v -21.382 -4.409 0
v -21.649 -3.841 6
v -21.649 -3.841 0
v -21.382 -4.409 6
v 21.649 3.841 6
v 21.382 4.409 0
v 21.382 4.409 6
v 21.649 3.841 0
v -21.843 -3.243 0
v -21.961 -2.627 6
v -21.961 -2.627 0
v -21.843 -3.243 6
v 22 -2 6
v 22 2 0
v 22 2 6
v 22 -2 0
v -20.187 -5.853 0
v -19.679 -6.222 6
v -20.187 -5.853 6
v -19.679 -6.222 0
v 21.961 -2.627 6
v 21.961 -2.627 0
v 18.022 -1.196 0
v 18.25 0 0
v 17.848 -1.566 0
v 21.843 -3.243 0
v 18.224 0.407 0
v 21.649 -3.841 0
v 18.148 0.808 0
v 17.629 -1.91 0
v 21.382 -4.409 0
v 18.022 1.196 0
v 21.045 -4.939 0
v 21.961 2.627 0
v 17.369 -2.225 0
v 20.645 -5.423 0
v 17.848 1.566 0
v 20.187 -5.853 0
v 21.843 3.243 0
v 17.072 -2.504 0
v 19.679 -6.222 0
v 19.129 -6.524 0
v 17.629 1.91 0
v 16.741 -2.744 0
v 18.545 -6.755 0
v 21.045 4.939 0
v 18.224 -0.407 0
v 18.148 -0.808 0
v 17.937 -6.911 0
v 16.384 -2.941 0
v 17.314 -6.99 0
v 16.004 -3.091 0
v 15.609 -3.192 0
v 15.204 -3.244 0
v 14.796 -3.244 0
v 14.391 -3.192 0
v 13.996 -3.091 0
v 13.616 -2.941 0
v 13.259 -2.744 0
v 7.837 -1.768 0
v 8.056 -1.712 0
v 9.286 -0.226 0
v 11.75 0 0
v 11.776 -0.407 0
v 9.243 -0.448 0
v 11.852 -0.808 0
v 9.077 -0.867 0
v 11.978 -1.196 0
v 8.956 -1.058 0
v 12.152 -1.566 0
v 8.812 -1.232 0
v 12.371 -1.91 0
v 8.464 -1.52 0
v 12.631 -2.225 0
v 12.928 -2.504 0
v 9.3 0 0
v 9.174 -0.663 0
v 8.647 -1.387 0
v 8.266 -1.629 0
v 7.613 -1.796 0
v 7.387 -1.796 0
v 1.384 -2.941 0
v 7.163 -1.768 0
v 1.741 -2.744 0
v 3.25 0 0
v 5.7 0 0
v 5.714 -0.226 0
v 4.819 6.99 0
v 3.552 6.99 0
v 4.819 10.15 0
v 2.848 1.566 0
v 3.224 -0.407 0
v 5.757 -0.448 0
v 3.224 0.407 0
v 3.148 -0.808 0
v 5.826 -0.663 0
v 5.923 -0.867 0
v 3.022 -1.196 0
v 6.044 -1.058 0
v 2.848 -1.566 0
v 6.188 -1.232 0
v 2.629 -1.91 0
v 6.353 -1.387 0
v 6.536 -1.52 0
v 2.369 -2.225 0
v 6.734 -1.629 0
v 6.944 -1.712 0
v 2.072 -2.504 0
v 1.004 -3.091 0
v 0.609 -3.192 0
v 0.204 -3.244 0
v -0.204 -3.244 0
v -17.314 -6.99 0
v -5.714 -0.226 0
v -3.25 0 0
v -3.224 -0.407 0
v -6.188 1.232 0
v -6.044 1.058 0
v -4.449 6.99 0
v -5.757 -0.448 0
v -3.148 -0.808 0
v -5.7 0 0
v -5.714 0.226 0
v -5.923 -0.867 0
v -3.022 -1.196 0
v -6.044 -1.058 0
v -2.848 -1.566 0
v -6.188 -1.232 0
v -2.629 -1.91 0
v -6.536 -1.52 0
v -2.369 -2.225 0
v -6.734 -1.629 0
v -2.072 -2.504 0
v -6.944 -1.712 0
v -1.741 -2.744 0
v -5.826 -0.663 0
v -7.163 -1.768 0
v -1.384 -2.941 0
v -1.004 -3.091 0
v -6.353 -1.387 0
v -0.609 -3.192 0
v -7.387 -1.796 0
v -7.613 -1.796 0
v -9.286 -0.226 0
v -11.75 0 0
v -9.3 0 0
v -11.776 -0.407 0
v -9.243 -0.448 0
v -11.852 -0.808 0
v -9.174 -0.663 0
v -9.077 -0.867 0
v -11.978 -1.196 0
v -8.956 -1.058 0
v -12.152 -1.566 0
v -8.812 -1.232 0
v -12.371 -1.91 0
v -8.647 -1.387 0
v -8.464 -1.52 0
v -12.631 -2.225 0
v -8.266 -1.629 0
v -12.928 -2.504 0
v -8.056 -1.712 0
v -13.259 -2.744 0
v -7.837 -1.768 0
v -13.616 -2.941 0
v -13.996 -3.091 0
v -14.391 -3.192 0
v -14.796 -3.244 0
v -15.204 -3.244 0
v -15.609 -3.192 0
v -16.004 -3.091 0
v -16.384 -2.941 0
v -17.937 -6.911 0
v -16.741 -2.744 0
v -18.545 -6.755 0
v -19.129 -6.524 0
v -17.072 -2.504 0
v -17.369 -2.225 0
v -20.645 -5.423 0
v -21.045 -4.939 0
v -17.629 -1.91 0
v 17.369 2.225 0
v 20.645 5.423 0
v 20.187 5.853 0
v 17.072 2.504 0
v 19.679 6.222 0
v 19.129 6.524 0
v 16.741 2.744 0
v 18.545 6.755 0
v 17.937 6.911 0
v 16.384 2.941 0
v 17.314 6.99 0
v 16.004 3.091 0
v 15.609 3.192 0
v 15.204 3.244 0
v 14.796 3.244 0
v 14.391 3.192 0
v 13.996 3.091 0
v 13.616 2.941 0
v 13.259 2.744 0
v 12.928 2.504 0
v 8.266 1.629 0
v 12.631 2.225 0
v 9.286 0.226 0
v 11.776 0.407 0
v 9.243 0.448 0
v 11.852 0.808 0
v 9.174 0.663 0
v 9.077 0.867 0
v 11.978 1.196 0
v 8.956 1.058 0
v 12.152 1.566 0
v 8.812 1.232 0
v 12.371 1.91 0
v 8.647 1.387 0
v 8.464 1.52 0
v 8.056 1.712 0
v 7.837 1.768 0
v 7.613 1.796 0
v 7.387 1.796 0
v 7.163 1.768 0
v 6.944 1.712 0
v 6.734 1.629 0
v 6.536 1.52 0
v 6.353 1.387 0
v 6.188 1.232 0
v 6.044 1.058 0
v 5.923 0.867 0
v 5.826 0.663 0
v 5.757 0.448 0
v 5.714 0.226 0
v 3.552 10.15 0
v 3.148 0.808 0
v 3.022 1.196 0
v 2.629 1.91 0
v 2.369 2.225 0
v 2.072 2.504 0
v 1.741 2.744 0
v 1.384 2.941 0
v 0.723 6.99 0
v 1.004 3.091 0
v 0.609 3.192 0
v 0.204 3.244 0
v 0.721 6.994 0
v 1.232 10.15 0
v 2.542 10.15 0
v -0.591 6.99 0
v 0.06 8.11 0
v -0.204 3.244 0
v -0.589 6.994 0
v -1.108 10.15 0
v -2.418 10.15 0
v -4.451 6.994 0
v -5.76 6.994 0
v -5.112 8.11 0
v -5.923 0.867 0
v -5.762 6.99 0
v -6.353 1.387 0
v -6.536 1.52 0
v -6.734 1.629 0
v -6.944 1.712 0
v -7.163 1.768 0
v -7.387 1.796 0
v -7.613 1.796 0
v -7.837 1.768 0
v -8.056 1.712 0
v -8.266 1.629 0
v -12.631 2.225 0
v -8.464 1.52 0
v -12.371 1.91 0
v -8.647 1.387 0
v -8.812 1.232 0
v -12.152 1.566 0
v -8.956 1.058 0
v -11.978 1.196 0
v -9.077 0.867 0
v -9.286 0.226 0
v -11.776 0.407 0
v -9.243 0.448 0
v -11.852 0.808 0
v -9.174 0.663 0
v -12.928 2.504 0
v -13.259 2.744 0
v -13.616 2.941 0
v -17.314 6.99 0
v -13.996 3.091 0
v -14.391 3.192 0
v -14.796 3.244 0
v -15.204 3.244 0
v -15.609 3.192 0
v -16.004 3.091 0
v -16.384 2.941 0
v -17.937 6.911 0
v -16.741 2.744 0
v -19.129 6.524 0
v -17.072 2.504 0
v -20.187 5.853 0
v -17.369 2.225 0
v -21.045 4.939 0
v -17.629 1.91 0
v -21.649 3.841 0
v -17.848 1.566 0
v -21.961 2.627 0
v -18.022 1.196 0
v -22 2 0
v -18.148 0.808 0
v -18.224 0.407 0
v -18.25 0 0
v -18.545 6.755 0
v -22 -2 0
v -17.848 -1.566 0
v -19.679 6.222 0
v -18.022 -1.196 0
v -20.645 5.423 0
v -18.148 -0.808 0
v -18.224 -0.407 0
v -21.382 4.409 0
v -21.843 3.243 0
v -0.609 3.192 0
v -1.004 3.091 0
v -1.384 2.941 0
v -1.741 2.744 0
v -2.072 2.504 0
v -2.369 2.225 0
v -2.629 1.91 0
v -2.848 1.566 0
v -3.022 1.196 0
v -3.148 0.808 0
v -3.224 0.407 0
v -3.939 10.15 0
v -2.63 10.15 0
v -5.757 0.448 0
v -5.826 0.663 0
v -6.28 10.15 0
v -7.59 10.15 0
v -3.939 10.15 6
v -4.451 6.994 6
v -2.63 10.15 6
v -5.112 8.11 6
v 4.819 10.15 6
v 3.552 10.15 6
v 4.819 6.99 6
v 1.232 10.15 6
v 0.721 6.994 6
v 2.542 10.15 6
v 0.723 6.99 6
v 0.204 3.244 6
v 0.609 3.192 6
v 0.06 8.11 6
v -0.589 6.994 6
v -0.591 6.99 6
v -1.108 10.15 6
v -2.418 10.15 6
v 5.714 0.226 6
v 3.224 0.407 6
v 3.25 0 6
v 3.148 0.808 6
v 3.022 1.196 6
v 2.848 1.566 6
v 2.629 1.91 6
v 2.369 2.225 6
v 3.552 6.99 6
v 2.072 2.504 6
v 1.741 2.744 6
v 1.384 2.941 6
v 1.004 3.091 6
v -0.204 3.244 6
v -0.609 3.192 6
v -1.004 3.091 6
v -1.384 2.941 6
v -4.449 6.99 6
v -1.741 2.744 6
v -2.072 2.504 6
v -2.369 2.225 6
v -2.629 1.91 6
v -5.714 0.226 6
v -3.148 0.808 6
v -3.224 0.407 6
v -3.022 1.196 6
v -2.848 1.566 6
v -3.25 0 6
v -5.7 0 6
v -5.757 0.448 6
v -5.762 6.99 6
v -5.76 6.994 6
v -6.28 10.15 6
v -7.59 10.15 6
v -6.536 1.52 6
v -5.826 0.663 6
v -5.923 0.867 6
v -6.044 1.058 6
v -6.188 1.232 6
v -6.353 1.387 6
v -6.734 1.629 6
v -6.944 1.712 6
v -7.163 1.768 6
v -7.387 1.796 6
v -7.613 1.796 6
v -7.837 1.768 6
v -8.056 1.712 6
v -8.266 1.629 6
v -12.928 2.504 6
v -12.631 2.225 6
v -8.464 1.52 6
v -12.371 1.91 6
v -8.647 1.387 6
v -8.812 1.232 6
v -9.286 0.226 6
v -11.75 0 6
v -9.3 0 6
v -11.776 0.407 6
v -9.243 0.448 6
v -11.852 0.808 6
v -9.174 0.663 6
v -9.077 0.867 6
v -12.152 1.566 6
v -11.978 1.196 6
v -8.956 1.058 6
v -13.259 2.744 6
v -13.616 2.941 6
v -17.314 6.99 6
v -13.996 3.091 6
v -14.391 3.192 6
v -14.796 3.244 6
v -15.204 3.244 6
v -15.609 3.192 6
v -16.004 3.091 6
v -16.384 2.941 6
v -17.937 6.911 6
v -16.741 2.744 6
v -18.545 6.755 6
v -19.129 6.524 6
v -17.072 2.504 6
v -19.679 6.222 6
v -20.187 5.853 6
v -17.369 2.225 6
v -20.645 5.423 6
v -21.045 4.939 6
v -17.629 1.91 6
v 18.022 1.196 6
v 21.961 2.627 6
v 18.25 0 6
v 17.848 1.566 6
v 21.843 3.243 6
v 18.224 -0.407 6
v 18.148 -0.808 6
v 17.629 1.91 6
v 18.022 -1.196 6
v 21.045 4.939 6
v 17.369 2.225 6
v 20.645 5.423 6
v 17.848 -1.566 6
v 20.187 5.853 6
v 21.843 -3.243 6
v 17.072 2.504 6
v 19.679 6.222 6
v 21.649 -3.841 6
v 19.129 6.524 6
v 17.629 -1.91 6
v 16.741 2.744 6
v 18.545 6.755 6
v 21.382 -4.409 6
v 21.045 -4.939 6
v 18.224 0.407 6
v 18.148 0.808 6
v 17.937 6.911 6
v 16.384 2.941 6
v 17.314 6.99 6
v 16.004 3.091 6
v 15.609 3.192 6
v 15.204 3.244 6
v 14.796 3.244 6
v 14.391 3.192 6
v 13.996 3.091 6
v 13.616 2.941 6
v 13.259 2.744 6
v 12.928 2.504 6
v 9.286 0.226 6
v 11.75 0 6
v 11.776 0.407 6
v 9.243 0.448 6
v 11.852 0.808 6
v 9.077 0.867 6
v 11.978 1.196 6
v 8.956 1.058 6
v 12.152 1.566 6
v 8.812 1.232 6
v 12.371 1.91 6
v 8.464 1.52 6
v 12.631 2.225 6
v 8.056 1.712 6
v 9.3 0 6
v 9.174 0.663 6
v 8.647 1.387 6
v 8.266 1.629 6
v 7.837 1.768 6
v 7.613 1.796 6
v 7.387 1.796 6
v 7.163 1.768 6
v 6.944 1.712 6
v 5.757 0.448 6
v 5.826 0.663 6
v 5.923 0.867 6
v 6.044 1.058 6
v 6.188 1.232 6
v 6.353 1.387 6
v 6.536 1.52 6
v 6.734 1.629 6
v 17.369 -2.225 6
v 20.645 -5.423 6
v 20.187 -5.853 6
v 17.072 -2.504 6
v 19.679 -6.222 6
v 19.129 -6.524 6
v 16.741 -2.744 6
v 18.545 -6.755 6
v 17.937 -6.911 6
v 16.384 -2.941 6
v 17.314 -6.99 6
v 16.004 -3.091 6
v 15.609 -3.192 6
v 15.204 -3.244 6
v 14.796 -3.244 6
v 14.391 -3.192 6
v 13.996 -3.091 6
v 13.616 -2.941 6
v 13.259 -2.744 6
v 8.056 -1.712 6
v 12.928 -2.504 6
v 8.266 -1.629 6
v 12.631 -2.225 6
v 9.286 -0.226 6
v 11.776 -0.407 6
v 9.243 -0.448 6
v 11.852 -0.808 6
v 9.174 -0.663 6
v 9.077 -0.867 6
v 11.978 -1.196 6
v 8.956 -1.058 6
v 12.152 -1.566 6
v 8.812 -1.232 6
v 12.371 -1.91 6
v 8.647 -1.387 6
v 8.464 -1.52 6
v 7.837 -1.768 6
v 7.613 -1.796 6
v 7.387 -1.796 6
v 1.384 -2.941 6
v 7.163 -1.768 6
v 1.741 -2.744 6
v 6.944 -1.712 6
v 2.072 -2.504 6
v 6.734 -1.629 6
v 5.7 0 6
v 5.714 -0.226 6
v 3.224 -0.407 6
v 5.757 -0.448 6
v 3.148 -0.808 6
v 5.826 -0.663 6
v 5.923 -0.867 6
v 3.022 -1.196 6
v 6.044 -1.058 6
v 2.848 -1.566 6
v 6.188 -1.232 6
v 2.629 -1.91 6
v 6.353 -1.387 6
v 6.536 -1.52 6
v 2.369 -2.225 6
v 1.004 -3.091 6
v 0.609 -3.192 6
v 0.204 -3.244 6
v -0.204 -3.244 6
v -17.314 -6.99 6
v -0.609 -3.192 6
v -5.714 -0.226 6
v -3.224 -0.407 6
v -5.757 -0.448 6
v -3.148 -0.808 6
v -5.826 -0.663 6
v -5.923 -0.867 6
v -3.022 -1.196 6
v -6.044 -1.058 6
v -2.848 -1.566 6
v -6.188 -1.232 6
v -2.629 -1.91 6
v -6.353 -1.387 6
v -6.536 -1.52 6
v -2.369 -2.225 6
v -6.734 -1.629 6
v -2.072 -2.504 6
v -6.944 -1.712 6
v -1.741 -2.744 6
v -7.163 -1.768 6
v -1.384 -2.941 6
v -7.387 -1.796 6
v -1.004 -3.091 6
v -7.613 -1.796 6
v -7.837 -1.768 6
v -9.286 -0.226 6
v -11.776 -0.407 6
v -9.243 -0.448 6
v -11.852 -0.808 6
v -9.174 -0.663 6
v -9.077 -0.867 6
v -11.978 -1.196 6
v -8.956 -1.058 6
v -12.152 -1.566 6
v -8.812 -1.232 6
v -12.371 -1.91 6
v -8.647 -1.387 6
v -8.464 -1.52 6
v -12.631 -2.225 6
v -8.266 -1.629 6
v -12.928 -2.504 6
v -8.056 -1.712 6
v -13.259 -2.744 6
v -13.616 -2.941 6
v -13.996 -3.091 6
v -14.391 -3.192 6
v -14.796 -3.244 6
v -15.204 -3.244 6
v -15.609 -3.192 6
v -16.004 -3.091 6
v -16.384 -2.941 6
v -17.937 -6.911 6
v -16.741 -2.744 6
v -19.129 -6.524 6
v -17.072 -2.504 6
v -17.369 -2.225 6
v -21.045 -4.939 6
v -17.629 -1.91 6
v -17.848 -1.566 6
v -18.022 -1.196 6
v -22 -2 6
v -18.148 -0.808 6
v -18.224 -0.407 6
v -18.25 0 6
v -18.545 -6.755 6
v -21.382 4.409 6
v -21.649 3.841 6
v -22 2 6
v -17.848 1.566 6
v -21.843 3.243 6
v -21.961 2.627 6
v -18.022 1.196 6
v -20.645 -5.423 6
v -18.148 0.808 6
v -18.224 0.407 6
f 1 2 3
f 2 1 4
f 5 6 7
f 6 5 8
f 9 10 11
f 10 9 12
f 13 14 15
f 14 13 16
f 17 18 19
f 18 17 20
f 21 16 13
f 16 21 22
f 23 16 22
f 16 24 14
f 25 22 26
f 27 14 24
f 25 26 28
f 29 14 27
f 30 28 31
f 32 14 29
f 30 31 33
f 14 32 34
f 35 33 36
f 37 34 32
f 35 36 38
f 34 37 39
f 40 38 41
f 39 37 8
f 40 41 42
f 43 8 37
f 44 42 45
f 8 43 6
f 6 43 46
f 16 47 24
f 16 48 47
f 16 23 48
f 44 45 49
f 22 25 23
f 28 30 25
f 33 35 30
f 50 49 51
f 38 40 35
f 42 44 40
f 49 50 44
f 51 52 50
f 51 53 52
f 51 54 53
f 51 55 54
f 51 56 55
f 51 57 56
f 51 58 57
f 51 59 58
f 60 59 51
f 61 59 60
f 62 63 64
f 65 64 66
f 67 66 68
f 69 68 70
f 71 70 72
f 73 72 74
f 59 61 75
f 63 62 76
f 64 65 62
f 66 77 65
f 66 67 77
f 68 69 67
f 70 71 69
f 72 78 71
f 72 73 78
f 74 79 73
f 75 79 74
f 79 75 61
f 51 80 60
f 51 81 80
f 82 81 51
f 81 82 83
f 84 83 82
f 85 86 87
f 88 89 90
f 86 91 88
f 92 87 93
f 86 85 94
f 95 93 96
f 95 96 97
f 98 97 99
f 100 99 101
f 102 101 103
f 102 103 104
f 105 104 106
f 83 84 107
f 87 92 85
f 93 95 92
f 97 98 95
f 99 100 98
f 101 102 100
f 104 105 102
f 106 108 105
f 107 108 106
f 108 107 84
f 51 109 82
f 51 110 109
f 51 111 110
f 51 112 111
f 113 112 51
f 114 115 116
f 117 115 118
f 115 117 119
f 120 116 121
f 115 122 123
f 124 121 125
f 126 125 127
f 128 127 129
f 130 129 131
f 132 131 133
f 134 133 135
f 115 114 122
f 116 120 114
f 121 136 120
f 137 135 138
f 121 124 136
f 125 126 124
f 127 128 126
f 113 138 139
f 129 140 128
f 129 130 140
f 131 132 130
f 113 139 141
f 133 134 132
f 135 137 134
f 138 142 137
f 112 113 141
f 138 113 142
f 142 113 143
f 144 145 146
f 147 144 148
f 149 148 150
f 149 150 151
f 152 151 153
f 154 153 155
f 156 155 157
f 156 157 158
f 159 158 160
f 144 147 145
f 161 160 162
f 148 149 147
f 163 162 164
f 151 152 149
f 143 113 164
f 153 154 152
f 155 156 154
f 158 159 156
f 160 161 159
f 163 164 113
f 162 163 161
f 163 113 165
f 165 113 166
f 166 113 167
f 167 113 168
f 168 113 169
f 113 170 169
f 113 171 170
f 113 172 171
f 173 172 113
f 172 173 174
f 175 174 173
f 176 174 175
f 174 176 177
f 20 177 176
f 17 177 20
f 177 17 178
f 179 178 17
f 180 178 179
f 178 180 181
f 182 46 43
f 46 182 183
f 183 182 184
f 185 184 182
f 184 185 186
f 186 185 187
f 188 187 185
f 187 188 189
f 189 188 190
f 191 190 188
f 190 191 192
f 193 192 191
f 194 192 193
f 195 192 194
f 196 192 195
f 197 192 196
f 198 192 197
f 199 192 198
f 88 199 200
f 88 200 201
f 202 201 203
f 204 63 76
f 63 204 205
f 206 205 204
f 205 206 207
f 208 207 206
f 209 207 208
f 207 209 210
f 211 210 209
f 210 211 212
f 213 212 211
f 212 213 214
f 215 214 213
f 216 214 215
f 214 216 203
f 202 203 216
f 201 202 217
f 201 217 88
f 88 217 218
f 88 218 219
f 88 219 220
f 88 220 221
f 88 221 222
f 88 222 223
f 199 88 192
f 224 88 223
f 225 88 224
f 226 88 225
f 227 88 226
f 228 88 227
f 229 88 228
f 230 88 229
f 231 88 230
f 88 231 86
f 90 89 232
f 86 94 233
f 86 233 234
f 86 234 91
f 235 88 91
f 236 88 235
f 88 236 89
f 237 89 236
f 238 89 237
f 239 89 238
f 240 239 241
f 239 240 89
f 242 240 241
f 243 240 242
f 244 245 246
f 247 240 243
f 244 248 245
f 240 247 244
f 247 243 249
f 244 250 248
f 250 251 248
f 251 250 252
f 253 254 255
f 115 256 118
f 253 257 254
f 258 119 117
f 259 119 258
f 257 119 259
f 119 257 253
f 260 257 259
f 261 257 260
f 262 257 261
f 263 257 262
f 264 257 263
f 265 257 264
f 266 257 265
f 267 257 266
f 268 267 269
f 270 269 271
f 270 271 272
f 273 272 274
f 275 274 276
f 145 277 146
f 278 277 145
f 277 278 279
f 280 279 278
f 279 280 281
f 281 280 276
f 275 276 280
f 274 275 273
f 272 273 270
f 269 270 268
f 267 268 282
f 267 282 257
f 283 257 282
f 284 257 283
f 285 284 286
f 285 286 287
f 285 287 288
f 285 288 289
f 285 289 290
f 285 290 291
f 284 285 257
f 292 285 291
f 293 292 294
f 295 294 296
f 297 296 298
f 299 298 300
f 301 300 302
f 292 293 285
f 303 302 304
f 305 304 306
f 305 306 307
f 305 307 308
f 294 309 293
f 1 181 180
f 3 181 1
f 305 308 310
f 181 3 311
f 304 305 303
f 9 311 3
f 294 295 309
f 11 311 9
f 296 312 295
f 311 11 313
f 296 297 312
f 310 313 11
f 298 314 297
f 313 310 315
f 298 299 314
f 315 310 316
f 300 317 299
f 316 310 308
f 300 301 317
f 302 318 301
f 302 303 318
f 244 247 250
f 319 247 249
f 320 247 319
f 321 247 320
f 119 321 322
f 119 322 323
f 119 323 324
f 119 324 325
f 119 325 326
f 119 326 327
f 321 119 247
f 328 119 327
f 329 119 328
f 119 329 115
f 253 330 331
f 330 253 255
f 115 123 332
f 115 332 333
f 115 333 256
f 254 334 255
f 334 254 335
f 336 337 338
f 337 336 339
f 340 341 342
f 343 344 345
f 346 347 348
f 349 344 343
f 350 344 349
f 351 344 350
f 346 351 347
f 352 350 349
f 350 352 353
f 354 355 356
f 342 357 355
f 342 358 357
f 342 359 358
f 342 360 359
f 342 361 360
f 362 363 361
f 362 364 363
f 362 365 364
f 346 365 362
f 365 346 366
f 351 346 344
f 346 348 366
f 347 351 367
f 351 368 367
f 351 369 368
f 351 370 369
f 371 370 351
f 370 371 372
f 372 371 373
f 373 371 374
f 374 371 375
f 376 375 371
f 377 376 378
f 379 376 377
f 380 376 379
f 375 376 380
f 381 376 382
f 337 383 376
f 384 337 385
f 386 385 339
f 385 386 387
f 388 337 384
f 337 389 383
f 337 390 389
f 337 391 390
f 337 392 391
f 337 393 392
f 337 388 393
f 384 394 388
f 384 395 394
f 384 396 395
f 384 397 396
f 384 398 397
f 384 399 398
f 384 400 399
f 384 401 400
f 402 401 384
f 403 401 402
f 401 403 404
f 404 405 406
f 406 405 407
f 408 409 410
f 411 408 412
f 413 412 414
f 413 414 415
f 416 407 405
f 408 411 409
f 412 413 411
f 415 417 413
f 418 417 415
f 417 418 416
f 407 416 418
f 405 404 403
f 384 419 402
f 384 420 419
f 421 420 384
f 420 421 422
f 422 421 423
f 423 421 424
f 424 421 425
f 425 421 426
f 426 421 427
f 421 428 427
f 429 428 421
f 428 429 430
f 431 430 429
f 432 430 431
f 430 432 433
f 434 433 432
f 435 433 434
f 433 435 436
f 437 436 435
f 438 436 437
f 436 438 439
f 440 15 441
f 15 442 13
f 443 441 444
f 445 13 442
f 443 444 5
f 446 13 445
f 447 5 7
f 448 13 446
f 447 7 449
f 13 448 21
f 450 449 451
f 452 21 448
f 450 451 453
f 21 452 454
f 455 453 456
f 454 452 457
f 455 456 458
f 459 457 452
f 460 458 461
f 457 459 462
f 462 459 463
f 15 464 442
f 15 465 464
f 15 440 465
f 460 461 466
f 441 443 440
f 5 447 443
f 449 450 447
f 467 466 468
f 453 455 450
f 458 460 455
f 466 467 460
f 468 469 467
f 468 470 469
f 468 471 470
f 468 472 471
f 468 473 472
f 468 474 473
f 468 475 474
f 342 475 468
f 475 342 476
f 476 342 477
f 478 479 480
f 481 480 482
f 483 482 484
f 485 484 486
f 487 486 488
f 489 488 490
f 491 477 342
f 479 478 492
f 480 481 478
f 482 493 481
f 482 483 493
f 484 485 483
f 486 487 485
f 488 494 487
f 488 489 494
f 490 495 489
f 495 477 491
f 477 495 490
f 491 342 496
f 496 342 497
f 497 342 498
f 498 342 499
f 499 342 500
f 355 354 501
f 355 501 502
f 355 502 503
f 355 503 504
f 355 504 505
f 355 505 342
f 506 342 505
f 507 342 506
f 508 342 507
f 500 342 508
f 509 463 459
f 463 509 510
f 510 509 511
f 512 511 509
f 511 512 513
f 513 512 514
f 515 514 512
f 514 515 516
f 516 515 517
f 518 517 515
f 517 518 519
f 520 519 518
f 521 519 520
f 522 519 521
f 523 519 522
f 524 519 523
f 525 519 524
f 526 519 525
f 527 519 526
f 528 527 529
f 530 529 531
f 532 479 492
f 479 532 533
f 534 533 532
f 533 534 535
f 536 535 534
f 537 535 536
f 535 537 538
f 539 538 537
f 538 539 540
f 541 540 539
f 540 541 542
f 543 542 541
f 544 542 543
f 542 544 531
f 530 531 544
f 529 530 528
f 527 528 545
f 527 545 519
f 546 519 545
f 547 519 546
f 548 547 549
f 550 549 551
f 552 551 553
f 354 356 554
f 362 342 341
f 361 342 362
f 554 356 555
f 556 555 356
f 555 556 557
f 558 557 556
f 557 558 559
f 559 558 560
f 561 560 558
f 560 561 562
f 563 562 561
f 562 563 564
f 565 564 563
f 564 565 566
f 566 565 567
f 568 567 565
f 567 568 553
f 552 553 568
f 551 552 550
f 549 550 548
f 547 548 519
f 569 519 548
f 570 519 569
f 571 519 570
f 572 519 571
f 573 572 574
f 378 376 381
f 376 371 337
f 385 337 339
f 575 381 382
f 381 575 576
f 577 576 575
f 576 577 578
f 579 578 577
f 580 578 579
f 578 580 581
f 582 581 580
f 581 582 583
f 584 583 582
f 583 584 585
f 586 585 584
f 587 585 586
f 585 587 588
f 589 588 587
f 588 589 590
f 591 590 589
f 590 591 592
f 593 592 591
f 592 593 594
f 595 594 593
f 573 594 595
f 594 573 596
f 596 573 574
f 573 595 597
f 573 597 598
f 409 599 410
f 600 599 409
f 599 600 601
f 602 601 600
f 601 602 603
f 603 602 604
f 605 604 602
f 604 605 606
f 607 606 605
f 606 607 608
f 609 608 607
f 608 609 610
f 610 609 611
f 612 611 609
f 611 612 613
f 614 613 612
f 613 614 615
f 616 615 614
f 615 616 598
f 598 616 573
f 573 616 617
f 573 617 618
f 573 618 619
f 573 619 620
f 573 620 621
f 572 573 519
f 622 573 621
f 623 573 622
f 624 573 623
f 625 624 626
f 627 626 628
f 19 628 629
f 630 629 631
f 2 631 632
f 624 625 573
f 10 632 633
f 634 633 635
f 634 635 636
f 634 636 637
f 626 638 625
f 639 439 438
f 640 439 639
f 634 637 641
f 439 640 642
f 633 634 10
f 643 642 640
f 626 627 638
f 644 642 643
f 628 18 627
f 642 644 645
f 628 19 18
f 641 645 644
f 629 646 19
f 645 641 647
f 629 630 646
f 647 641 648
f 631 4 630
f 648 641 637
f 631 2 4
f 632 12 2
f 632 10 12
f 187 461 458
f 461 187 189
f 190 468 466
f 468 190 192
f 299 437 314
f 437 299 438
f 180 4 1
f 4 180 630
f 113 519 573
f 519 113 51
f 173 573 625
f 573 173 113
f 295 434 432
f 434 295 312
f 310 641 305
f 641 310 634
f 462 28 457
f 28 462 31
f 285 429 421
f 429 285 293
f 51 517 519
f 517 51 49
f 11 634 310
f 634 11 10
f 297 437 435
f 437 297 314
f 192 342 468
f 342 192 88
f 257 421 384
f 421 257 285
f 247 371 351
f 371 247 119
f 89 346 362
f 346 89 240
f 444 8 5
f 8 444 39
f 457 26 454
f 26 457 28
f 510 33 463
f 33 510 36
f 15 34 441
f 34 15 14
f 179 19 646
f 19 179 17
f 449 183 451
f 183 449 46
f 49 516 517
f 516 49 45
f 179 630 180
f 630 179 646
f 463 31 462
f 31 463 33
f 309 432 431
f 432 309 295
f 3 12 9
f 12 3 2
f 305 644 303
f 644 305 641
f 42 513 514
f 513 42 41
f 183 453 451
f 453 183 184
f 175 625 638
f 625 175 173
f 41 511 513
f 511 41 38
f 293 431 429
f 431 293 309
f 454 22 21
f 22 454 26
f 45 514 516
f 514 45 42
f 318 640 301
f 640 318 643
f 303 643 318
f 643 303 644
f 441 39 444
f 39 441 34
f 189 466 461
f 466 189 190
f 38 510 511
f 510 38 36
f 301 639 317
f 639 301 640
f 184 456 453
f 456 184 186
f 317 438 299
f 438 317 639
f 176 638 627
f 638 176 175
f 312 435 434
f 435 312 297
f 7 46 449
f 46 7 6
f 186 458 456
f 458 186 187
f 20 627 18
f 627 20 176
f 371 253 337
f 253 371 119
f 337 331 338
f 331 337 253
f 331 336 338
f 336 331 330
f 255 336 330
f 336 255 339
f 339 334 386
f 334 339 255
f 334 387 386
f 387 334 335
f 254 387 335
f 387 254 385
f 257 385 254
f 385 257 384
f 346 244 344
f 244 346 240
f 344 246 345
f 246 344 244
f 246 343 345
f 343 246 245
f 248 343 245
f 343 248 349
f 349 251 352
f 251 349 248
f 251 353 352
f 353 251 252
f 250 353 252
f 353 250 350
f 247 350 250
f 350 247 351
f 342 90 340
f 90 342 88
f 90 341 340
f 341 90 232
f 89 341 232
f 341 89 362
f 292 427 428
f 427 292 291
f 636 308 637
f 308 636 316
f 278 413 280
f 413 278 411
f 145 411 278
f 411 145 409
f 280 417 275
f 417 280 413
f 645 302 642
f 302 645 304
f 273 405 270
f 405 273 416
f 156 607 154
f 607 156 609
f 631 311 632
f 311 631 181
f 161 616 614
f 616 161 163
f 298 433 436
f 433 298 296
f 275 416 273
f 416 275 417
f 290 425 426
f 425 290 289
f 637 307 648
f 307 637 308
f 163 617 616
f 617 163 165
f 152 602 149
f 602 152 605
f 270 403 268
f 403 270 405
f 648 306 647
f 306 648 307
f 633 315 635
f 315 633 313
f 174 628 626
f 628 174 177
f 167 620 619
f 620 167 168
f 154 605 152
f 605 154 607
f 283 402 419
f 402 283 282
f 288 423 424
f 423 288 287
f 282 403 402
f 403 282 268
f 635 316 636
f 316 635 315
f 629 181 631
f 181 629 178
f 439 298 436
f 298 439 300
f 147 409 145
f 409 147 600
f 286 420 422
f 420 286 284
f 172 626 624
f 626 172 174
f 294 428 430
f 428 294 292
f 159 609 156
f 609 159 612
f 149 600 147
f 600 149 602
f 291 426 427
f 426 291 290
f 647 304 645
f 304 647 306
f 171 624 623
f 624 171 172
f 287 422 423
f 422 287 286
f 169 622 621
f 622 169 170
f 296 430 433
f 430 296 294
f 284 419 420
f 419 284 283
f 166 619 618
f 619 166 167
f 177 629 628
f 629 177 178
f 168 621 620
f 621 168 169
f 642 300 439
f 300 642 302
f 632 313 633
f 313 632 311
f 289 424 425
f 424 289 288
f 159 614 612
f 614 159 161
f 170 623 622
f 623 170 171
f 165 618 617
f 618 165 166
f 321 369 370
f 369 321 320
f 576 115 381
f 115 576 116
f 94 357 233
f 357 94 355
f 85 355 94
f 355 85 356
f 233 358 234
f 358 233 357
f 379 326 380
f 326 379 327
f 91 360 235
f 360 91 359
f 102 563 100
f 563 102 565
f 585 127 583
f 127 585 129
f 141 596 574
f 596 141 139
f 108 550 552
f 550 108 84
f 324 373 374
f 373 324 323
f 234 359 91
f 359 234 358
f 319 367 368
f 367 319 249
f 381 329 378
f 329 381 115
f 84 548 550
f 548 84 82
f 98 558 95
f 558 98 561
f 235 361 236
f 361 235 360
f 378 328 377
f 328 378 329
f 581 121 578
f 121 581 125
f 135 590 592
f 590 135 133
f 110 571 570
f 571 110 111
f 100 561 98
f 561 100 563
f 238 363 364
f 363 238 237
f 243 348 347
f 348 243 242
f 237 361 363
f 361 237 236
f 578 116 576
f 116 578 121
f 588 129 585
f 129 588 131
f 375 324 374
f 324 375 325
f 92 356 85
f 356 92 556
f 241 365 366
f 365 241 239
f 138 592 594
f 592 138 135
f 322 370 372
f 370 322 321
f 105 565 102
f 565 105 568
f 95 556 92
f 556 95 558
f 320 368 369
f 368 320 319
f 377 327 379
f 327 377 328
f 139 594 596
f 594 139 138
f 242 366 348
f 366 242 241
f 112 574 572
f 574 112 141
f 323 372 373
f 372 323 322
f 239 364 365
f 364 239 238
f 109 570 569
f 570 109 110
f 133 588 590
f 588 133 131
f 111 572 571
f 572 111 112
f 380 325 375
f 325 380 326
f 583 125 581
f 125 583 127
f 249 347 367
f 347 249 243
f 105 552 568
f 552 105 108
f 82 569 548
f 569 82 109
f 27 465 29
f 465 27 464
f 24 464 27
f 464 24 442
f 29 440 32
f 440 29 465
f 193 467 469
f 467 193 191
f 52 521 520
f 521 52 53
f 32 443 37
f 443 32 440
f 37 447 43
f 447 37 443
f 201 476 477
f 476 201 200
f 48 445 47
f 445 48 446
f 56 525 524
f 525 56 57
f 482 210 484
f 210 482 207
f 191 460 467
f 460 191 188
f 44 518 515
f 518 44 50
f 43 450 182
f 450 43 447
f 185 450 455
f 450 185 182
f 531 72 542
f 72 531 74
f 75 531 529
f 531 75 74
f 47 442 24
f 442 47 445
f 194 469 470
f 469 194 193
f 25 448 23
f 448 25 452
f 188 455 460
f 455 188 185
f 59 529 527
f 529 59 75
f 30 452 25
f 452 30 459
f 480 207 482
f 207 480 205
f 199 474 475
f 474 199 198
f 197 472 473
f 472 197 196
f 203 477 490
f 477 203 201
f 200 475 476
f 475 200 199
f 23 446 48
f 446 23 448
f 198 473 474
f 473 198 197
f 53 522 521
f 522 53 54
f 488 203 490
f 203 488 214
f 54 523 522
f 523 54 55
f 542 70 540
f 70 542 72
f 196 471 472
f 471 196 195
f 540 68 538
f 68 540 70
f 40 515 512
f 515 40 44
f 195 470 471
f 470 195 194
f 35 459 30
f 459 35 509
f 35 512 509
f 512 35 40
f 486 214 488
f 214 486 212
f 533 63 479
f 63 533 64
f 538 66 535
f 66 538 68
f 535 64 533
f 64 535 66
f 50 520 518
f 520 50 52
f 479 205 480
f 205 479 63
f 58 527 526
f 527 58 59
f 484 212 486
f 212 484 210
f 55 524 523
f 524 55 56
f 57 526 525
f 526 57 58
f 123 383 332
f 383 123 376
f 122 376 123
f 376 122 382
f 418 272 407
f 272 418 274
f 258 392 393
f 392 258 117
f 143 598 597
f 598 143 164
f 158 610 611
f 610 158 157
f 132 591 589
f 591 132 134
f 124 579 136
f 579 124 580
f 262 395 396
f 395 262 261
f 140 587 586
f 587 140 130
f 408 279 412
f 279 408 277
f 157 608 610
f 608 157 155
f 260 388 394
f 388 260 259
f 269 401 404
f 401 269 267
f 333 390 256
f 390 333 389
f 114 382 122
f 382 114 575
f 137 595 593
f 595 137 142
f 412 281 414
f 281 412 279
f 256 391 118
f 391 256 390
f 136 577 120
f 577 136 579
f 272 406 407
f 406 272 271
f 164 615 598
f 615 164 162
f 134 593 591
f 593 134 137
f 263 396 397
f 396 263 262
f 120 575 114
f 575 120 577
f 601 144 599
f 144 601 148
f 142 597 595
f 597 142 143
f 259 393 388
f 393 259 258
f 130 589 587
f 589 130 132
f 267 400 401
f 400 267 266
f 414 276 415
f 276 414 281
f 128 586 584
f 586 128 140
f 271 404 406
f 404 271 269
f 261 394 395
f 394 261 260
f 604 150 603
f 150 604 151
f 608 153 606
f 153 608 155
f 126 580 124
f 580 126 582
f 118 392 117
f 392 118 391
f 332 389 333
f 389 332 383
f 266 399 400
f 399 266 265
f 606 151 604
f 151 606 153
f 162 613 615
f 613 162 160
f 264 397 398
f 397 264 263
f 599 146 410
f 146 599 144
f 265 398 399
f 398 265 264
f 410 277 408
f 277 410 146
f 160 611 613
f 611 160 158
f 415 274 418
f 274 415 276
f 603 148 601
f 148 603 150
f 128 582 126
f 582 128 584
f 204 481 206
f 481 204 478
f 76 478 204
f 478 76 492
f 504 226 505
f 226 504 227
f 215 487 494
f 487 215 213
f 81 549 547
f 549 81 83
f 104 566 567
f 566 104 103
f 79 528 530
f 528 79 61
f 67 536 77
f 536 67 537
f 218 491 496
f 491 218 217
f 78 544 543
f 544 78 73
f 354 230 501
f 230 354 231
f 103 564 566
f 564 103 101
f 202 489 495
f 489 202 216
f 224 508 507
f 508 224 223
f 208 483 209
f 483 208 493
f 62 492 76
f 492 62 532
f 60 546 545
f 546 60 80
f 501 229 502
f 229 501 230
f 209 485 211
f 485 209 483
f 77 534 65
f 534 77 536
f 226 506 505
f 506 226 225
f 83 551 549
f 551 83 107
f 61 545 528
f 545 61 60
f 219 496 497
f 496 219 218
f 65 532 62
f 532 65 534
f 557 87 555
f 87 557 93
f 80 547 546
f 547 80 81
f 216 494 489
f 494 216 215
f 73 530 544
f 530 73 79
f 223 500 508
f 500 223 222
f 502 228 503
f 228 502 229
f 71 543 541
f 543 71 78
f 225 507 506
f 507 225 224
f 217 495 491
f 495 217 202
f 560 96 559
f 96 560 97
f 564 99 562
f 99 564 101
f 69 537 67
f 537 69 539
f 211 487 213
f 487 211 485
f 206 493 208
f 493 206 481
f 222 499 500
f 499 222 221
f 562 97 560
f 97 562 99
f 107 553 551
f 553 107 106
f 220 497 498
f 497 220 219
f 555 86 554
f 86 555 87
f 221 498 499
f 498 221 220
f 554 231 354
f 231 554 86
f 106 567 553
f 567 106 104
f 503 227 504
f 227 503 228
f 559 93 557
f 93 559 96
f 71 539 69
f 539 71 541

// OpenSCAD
$fn = 50;


difference() {
	union() {
		hull() {
			translate(v = [-17.0000000000, 2.0000000000, 0]) {
				cylinder(h = 6, r = 5);
			}
			translate(v = [17.0000000000, 2.0000000000, 0]) {
				cylinder(h = 6, r = 5);
			}
			translate(v = [-17.0000000000, -2.0000000000, 0]) {
				cylinder(h = 6, r = 5);
			}
			translate(v = [17.0000000000, -2.0000000000, 0]) {
				cylinder(h = 6, r = 5);
			}
		}
		translate(v = [0, 10.0000000000, 0]) {
			linear_extrude(height = 6) {
				text(font = "DejaVu Sans Mono:style=Bold", halign = "center", size = 6.3333333333, text = "XXL", valign = "top");
			}
		}
	}
	union() {
		translate(v = [-15.0000000000, 0.0000000000, 0]) {
			translate(v = [0, 0, -100]) {
				cylinder(h = 200, r = 3.2500000000);
			}
		}
		translate(v = [0, 0, -100]) {
			cylinder(h = 200, r = 3.2500000000);
		}
		translate(v = [15.0000000000, 0.0000000000, 0]) {
			translate(v = [0, 0, -100]) {
				cylinder(h = 200, r = 3.2500000000);
			}
		}
		translate(v = [-15.0000000000, 0.0000000000, 0]) {
			translate(v = [0, 0, -100]) {
				cylinder(h = 200, r = 1.8000000000);
			}
		}
		translate(v = [-7.5000000000, 0.0000000000, 0]) {
			translate(v = [0, 0, -100]) {
				cylinder(h = 200, r = 1.8000000000);
			}
		}
		translate(v = [0, 0, -100]) {
			cylinder(h = 200, r = 1.8000000000);
		}
		translate(v = [7.5000000000, 0.0000000000, 0]) {
			translate(v = [0, 0, -100]) {
				cylinder(h = 200, r = 1.8000000000);
			}
		}
		translate(v = [15.0000000000, 0.0000000000, 0]) {
			translate(v = [0, 0, -100]) {
				cylinder(h = 200, r = 1.8000000000);
			}
		}
	}
}
